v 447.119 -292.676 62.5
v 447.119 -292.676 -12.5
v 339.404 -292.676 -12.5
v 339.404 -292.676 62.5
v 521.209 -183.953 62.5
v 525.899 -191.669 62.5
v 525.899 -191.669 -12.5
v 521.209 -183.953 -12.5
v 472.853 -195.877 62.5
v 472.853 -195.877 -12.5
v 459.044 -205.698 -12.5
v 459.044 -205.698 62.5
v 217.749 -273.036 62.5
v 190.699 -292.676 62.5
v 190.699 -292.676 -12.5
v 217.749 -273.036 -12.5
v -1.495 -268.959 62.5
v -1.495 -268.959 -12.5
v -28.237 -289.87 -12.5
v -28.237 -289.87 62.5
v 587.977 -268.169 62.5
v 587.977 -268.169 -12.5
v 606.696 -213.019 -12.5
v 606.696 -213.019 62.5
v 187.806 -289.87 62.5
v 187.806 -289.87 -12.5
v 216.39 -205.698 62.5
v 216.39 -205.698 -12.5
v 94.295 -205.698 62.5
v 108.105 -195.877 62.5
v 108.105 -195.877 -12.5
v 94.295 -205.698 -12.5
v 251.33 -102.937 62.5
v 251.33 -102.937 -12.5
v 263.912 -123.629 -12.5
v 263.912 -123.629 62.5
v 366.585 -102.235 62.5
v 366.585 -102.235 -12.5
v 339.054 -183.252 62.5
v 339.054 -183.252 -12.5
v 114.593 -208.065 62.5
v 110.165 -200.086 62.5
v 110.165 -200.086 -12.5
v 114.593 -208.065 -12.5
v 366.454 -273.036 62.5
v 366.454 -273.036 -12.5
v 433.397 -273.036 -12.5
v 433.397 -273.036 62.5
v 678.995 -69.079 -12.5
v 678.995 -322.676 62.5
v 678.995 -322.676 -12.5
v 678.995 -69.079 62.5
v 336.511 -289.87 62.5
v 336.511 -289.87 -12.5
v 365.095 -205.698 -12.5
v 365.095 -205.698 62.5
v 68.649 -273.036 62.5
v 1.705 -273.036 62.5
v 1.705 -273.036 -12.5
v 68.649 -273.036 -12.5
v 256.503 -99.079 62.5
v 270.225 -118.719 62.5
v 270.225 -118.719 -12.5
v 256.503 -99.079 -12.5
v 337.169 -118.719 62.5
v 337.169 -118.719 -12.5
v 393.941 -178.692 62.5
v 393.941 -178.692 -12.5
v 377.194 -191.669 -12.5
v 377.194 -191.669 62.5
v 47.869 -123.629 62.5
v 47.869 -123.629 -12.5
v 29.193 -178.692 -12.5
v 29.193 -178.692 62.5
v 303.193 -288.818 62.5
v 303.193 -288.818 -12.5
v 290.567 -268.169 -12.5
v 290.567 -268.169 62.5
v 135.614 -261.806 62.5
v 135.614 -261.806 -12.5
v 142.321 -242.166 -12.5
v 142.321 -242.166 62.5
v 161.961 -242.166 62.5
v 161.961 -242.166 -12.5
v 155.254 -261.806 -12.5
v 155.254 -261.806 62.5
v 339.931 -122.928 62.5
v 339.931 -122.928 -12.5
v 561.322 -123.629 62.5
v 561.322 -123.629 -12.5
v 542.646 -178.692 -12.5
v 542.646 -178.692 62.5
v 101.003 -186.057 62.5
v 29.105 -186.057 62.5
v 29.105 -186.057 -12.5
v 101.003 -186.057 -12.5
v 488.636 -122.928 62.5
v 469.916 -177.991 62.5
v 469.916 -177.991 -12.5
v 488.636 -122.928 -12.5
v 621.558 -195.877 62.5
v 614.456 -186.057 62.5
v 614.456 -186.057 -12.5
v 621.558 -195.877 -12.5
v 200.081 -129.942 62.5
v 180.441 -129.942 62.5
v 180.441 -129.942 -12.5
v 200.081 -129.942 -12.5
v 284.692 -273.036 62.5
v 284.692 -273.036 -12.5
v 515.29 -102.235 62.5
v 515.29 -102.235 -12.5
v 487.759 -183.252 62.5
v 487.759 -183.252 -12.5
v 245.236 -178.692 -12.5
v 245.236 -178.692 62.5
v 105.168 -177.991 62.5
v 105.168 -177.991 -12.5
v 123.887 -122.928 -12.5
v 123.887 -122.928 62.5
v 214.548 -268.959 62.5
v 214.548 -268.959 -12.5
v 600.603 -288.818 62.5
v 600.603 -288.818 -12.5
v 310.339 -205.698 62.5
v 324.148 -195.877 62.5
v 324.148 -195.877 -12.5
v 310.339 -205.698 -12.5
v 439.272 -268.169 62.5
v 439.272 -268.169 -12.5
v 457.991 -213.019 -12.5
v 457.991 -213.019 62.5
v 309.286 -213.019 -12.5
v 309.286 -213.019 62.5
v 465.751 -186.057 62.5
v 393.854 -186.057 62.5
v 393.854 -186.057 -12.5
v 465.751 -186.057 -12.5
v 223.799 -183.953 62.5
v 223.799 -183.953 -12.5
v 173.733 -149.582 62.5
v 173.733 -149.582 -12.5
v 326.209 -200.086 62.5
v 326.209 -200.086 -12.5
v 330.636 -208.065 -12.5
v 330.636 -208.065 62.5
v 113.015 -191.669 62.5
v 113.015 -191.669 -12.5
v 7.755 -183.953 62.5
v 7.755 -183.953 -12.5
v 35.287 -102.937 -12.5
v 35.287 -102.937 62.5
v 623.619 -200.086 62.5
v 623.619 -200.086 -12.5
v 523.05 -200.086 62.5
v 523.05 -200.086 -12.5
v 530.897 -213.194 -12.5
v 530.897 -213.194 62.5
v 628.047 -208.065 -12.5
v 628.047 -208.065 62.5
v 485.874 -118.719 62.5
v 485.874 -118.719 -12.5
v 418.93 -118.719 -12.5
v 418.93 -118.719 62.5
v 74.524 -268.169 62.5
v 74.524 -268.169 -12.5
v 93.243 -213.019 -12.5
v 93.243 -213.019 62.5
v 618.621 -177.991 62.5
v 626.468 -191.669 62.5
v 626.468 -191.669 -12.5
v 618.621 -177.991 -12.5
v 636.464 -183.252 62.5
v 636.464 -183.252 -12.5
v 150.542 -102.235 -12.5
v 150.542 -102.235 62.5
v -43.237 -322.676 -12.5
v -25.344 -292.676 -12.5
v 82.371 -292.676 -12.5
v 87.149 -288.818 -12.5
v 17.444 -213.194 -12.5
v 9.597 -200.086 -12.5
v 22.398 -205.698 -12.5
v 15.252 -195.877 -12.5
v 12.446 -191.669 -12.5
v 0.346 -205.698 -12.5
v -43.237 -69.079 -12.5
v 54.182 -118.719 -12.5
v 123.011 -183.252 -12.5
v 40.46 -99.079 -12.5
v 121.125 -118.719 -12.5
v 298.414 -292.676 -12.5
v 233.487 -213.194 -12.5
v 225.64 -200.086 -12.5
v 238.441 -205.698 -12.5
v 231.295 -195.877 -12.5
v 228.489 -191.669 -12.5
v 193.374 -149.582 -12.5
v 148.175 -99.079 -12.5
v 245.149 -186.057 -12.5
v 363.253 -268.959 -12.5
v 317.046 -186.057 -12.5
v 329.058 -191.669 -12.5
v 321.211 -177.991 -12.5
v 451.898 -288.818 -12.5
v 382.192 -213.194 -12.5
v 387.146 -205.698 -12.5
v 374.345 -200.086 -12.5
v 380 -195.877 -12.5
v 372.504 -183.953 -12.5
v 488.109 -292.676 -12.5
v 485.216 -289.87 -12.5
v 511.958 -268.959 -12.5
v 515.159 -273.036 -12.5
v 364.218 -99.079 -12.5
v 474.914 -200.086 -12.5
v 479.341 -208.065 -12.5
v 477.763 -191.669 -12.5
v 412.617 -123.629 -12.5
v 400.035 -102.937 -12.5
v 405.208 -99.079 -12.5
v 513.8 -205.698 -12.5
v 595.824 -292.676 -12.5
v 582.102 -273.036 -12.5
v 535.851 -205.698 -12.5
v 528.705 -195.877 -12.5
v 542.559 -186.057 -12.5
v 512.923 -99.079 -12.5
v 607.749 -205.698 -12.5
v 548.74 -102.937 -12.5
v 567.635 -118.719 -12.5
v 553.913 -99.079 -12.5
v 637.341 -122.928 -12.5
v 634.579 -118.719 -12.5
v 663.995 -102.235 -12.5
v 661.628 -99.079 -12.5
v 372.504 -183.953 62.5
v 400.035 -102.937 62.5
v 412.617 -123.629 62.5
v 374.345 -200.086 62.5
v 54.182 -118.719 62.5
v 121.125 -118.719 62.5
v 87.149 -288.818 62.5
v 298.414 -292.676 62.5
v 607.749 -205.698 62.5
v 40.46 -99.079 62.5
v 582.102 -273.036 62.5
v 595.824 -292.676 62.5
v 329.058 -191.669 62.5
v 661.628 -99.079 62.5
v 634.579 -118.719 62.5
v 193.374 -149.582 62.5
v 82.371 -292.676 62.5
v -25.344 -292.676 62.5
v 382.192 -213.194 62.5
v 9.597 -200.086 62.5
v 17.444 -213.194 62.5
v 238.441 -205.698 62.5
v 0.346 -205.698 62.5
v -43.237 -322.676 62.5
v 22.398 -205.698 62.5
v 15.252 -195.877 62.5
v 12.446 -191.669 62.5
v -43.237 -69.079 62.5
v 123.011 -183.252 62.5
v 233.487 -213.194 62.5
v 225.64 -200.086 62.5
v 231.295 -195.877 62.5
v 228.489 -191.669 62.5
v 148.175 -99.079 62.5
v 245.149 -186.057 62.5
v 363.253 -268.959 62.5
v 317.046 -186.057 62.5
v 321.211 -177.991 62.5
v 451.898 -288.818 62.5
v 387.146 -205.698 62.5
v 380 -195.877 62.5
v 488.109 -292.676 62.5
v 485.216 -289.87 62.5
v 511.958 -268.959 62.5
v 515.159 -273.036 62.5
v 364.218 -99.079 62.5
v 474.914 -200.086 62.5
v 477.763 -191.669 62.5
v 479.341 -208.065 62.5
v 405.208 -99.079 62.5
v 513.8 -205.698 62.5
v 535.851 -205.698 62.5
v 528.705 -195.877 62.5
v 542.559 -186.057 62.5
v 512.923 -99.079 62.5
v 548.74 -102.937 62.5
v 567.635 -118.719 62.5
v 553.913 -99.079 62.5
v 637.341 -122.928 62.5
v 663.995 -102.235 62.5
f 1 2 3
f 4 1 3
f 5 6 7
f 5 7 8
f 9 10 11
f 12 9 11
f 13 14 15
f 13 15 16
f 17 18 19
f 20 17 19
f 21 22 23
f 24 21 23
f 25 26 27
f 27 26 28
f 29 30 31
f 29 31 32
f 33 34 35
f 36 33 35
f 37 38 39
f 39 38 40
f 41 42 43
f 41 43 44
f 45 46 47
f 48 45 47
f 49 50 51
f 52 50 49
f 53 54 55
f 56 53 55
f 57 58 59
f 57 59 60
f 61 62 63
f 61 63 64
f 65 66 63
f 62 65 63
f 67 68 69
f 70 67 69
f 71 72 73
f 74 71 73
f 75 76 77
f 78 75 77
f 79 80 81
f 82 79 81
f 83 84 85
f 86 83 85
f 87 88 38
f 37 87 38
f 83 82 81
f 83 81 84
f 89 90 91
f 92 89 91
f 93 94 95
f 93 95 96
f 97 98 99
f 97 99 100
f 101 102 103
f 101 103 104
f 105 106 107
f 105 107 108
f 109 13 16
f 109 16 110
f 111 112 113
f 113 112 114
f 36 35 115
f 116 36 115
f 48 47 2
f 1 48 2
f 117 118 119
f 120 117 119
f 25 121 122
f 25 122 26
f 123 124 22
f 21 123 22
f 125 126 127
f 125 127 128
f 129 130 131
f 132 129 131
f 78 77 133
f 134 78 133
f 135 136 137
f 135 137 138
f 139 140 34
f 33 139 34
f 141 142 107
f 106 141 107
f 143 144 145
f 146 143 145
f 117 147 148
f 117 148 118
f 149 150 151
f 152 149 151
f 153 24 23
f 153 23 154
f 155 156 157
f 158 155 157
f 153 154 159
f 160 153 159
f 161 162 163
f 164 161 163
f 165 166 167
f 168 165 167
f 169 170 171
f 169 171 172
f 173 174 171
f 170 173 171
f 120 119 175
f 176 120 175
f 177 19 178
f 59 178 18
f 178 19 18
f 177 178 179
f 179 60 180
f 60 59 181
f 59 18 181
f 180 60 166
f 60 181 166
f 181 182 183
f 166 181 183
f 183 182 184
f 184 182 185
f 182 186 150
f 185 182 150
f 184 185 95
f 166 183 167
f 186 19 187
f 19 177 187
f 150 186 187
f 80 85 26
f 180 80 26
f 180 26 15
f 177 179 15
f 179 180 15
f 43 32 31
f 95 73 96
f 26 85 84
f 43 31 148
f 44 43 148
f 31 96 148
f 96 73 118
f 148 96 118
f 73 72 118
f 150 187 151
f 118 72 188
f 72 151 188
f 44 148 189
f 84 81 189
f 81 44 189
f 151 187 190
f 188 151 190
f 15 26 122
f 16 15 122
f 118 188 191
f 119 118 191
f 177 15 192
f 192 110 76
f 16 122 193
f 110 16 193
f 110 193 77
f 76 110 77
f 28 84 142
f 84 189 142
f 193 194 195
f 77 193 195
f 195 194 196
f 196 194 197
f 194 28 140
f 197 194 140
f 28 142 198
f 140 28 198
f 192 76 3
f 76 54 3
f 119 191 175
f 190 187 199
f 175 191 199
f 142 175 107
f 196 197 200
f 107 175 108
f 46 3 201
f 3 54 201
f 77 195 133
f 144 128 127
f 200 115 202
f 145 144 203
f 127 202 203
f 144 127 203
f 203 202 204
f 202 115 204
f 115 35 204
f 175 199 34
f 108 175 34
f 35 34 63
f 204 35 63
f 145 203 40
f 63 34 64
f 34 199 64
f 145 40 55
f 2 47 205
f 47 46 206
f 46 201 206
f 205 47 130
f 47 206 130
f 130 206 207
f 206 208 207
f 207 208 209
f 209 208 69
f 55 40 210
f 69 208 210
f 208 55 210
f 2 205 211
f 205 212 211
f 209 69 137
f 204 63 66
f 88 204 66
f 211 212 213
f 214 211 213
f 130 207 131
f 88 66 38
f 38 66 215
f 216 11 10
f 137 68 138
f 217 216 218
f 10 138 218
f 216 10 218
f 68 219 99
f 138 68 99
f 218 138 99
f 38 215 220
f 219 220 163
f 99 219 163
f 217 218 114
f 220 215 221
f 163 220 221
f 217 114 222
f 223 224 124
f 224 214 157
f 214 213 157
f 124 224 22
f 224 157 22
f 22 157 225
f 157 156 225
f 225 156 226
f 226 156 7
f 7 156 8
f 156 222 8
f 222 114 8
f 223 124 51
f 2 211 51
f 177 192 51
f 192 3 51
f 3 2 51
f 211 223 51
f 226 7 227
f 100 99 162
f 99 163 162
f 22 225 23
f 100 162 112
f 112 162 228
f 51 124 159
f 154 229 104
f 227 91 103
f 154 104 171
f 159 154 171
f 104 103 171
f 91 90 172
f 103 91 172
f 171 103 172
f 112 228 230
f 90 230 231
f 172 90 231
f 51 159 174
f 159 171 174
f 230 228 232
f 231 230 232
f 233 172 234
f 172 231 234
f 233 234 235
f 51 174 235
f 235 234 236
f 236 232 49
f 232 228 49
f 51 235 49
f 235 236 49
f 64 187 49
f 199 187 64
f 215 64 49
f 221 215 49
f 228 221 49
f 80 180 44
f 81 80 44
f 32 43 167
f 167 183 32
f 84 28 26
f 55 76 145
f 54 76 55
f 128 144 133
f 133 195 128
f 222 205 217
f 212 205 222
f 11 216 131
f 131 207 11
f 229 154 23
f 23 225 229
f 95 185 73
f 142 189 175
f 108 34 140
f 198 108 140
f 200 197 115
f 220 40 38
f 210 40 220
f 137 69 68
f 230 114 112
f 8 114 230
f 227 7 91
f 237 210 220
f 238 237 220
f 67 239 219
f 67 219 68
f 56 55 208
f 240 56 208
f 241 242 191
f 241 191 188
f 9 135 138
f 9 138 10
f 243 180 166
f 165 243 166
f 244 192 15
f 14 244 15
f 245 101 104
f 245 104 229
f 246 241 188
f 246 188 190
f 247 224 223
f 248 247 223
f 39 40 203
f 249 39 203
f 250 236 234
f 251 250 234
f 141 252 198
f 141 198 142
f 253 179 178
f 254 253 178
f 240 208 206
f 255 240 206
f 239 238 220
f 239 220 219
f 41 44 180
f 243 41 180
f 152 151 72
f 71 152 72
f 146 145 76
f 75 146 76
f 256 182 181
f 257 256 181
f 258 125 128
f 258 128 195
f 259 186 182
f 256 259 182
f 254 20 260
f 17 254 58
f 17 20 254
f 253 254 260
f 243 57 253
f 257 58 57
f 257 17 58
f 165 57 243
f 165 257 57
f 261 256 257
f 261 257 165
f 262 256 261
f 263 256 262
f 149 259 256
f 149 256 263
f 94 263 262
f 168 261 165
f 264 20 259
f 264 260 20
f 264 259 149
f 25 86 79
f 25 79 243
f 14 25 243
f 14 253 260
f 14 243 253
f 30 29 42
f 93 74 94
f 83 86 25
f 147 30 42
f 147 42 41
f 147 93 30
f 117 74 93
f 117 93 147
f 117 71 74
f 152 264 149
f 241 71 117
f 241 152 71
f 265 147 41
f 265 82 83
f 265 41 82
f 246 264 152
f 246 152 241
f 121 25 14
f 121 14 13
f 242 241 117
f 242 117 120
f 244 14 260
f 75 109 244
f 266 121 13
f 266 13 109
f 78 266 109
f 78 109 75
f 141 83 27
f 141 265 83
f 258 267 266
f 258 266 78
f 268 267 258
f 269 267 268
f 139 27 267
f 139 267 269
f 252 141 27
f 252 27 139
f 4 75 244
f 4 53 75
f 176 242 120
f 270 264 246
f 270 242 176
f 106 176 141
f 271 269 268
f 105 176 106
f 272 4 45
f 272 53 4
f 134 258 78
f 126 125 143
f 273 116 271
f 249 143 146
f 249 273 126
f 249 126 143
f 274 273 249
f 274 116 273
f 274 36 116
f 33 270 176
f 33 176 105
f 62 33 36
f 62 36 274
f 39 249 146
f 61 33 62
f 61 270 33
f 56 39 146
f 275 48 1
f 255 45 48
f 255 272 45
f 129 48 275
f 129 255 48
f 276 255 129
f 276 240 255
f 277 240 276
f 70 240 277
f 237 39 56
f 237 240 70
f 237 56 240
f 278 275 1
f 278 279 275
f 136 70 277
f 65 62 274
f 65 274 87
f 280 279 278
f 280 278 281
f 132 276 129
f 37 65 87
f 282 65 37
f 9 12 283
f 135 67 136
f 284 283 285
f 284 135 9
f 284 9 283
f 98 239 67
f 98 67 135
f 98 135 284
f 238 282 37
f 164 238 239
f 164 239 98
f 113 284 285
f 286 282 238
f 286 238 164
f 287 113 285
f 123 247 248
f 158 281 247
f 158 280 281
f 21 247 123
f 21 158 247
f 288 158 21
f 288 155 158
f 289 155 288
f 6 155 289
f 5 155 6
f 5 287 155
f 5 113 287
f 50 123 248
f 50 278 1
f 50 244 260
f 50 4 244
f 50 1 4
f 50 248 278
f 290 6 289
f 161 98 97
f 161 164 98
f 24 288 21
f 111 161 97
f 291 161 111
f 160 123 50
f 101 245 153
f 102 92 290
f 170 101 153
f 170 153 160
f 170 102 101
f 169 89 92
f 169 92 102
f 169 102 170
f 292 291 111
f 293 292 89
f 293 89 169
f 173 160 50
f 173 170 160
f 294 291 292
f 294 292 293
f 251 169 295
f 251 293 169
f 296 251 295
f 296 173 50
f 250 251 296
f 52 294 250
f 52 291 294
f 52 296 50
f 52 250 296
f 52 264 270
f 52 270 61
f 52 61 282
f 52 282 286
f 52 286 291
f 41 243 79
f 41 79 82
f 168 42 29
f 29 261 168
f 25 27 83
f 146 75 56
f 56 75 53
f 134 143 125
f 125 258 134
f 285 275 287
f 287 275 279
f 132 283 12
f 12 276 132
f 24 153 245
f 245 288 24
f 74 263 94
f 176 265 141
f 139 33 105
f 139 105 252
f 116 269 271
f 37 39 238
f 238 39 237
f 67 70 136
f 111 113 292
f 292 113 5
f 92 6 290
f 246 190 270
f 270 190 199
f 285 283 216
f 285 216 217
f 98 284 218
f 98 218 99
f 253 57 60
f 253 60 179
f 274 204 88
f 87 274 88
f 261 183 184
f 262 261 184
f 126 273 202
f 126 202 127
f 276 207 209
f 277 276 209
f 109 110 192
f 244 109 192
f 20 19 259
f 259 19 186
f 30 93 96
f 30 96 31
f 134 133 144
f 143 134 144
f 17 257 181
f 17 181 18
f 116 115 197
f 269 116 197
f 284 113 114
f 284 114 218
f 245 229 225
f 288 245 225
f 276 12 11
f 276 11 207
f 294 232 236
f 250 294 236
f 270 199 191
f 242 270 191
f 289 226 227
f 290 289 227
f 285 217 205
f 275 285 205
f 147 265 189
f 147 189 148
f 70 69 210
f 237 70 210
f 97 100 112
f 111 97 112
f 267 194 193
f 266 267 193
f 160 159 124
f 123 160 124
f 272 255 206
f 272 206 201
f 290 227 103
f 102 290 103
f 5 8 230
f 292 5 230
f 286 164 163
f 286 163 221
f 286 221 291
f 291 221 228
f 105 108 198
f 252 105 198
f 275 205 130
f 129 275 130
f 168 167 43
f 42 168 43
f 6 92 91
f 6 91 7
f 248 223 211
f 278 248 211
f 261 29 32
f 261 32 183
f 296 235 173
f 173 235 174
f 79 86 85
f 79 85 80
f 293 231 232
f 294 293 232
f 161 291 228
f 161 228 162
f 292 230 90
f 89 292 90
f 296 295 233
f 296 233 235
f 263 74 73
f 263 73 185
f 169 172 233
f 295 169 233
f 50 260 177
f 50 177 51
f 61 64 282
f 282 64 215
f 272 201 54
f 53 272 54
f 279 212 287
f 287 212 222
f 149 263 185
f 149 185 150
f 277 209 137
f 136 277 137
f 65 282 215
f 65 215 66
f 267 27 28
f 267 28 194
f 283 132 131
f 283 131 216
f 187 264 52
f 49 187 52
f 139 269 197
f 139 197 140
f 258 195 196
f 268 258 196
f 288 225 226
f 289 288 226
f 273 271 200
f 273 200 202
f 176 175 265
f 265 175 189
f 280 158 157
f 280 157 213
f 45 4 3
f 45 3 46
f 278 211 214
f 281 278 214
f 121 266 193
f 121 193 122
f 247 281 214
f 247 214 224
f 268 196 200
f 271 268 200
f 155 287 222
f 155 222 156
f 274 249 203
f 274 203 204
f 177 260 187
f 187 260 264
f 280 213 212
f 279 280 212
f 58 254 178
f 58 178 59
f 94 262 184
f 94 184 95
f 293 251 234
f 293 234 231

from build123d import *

# Parameters (mm, degrees)
SKETCH_1_W            = 500
SKETCH_1_H            = 220
EXTRUDE_1_DEPTH       = 50
CUT_EXTRUDE_1_DEPTH   = 65
SKETCH_3_W            = 24.993501938
SKETCH_3_H            = 24.754329671
EXTRUDE_2_DEPTH       = 50
SKETCH_4_W            = 557.488309353
SKETCH_4_H            = 263.064748201
SKETCH_4_W_2          = 497.488309353
SKETCH_4_H_2          = 203.064748201
CUT_EXTRUDE_1_2_DEPTH = 84
SCALE_1_SCALE         = 1.5
SKETCH_8_W            = 822.232464029
SKETCH_8_H            = 353.597122302
SKETCH_8_W_2          = 722.232464029
SKETCH_8_H_2          = 253.597122302
CUT_EXTRUDE_2_DEPTH   = 180


with BuildPart() as part:
    # Эскиз1 → Бобышка-Вытянуть1 (new body)
    with BuildSketch(Plane.XY):
        with Locations((315.178539616, -203.237931197)):
            Rectangle(SKETCH_1_W, SKETCH_1_H)
        Polygon((203.546220768, -131.339893042), (185.513397027, -144.433418222), (140.884350264, -144.433418222), (131.736418609, -131.339893042), align=None, mode=Mode.SUBTRACT)
        Polygon((159.677066091, -260.404641243), (87.867263933, -260.404641243), (105.900087674, -247.311116064), (150.529134437, -247.311116064), align=None, mode=Mode.SUBTRACT)
        Polygon((116.392443789, -207.416781531), (103.766544509, -244.593040524), (85.938307098, -258.534137646), (104.994062494, -202.419029733), (111.160879041, -198.678022538), align=None, mode=Mode.SUBTRACT)
        Polygon((109.933361055, -187.922626855), (128.287677602, -133.911835488), (136.67571717, -147.706799517), (124.225177602, -184.41543261), (113.060609257, -193.066511747), align=None, mode=Mode.SUBTRACT)
        Polygon((181.158630839, -203.997267143), (162.86276753, -257.832698797), (154.445501343, -244.066961387), (166.92526753, -207.299875056), (178.20674235, -198.678022538), align=None, mode=Mode.SUBTRACT)
        Polygon((174.874907818, -183.947806711), (187.354674005, -147.239173618), (205.124458178, -133.444209589), (186.770141631, -187.455000956), (180.106472566, -193.066511747), align=None, mode=Mode.SUBTRACT)
        Polygon((172.098379041, -189.325504553), (176.833091271, -195.872267143), (167.626706379, -202.419029733), (119.695051703, -202.419029733), (114.931112854, -195.872267143), (124.166724365, -189.325504553), align=None, mode=Mode.SUBTRACT)
        Polygon((188.173019329, -260.404641243), (192.615465372, -247.311116064), (205.708990552, -247.311116064), (201.266544509, -260.404641243), align=None, mode=Mode.SUBTRACT)
        Polygon((220.585339473, -165.00895779), (225.057012134, -151.91543261), (238.150537314, -151.91543261), (233.678864652, -165.00895779), align=None, mode=Mode.SUBTRACT)
        Polygon((347.574997746, -131.339893042), (329.542174005, -144.433418222), (284.913127242, -144.433418222), (275.765195588, -131.339893042), align=None, mode=Mode.SUBTRACT)
        Polygon((303.70584307, -260.404641243), (231.896040911, -260.404641243), (249.928864652, -247.311116064), (294.557911415, -247.311116064), align=None, mode=Mode.SUBTRACT)
        Polygon((260.421220768, -207.416781531), (247.795321487, -244.593040524), (229.967084077, -258.534137646), (249.022839473, -202.419029733), (255.189656019, -198.678022538), align=None, mode=Mode.SUBTRACT)
        Polygon((253.962138034, -187.922626855), (272.31645458, -133.911835488), (280.704494149, -147.706799517), (268.25395458, -184.41543261), (257.089386235, -193.066511747), align=None, mode=Mode.SUBTRACT)
        Polygon((325.187407818, -203.997267143), (306.891544509, -257.832698797), (298.474278321, -244.066961387), (310.954044509, -207.299875056), (322.235519329, -198.678022538), align=None, mode=Mode.SUBTRACT)
        Polygon((318.903684796, -183.947806711), (331.383450983, -147.239173618), (349.153235156, -133.444209589), (330.798918609, -187.455000956), (324.135249545, -193.066511747), align=None, mode=Mode.SUBTRACT)
        Polygon((316.127156019, -189.325504553), (320.86186825, -195.872267143), (311.655483357, -202.419029733), (263.723828681, -202.419029733), (258.959889832, -195.872267143), (268.195501343, -189.325504553), align=None, mode=Mode.SUBTRACT)
        Polygon((446.711688393, -131.339893042), (428.678864652, -144.433418222), (384.04981789, -144.433418222), (374.901886235, -131.339893042), align=None, mode=Mode.SUBTRACT)
        Polygon((402.842533717, -260.404641243), (331.032731559, -260.404641243), (349.0655553, -247.311116064), (393.694602063, -247.311116064), align=None, mode=Mode.SUBTRACT)
        Polygon((359.557911415, -207.416781531), (346.932012134, -244.593040524), (329.103774724, -258.534137646), (348.15953012, -202.419029733), (354.326346667, -198.678022538), align=None, mode=Mode.SUBTRACT)
        Polygon((353.098828681, -187.922626855), (371.453145228, -133.911835488), (379.841184796, -147.706799517), (367.390645228, -184.41543261), (356.226076883, -193.066511747), align=None, mode=Mode.SUBTRACT)
        Polygon((424.324098465, -203.997267143), (406.028235156, -257.832698797), (397.610968969, -244.066961387), (410.090735156, -207.299875056), (421.372209976, -198.678022538), align=None, mode=Mode.SUBTRACT)
        Polygon((418.040375444, -183.947806711), (430.520141631, -147.239173618), (448.289925804, -133.444209589), (429.935609257, -187.455000956), (423.271940192, -193.066511747), align=None, mode=Mode.SUBTRACT)
        Polygon((415.263846667, -189.325504553), (419.998558897, -195.872267143), (410.792174005, -202.419029733), (362.860519329, -202.419029733), (358.09658048, -195.872267143), (367.332191991, -189.325504553), align=None, mode=Mode.SUBTRACT)
        Polygon((545.848379041, -131.339893042), (527.8155553, -144.433418222), (483.186508537, -144.433418222), (474.038576883, -131.339893042), align=None, mode=Mode.SUBTRACT)
        Polygon((501.979224365, -260.404641243), (430.169422206, -260.404641243), (448.202245947, -247.311116064), (492.83129271, -247.311116064), align=None, mode=Mode.SUBTRACT)
        Polygon((458.694602063, -207.416781531), (446.068702782, -244.593040524), (428.240465372, -258.534137646), (447.296220768, -202.419029733), (453.463037314, -198.678022538), align=None, mode=Mode.SUBTRACT)
        Polygon((452.235519329, -187.922626855), (470.589835875, -133.911835488), (478.977875444, -147.706799517), (466.527335875, -184.41543261), (455.36276753, -193.066511747), align=None, mode=Mode.SUBTRACT)
        Polygon((523.460789113, -203.997267143), (505.164925804, -257.832698797), (496.747659616, -244.066961387), (509.227425804, -207.299875056), (520.508900624, -198.678022538), align=None, mode=Mode.SUBTRACT)
        Polygon((517.177066091, -183.947806711), (529.656832278, -147.239173618), (547.426616451, -133.444209589), (529.072299904, -187.455000956), (522.408630839, -193.066511747), align=None, mode=Mode.SUBTRACT)
        Polygon((514.400537314, -189.325504553), (519.135249545, -195.872267143), (509.928864652, -202.419029733), (461.997209976, -202.419029733), (457.233271127, -195.872267143), (466.468882638, -189.325504553), align=None, mode=Mode.SUBTRACT)
    extrude(amount=EXTRUDE_1_DEPTH)

    # Эскиз2 → Cut-Extrude 1 (cut)
    with BuildSketch(Plane.XY.offset(50)):
        Polygon((225.057012134, -151.91543261), (238.150537314, -151.91543261), (233.678864652, -165.00895779), (220.585339473, -165.00895779), align=None)
        Polygon((199.643902872, -226.731116064), (212.737428052, -226.731116064), (208.26575539, -239.824641243), (195.17223021, -239.824641243), align=None)
    extrude(amount=-CUT_EXTRUDE_1_DEPTH, mode=Mode.SUBTRACT)

    # Эскиз3 → Бобышка-Вытянуть2 (add)
    with BuildSketch(Plane.XY.offset(50)):
        with Locations((196.457377331, -256.289777907)):
            Rectangle(SKETCH_3_W, SKETCH_3_H)
    extrude(amount=-EXTRUDE_2_DEPTH)

    # Эскиз4 → Cut-Extrude 1 2 (cut)
    with BuildSketch(Plane.XY.offset(50)):
        with Locations((316.682461775, -195.872267142)):
            Rectangle(SKETCH_4_W, SKETCH_4_H)
        with Locations((316.682461775, -195.872267142)):
            Rectangle(SKETCH_4_W_2, SKETCH_4_H_2, mode=Mode.SUBTRACT)
    extrude(amount=-CUT_EXTRUDE_1_2_DEPTH, mode=Mode.SUBTRACT)


with BuildPart() as part_1:
    # Масштаб1: scaled about (314.289349403, -195.861916492, 25)
    add(part.part.scale(SCALE_1_SCALE).moved(Location((-157.144674702, 97.930958246, -12.5))))

    # Эскиз8 → Вырез-Вытянуть-Тонкостенный2 (cut)
    with BuildSketch(Plane.XY.offset(62.5)):
        with Locations((317.879017961, -195.877442468)):
            Rectangle(SKETCH_8_W, SKETCH_8_H)
        with Locations((317.879017961, -195.877442468)):
            Rectangle(SKETCH_8_W_2, SKETCH_8_H_2, mode=Mode.SUBTRACT)
    extrude(amount=-CUT_EXTRUDE_2_DEPTH, mode=Mode.SUBTRACT)


solid = part_1.part
